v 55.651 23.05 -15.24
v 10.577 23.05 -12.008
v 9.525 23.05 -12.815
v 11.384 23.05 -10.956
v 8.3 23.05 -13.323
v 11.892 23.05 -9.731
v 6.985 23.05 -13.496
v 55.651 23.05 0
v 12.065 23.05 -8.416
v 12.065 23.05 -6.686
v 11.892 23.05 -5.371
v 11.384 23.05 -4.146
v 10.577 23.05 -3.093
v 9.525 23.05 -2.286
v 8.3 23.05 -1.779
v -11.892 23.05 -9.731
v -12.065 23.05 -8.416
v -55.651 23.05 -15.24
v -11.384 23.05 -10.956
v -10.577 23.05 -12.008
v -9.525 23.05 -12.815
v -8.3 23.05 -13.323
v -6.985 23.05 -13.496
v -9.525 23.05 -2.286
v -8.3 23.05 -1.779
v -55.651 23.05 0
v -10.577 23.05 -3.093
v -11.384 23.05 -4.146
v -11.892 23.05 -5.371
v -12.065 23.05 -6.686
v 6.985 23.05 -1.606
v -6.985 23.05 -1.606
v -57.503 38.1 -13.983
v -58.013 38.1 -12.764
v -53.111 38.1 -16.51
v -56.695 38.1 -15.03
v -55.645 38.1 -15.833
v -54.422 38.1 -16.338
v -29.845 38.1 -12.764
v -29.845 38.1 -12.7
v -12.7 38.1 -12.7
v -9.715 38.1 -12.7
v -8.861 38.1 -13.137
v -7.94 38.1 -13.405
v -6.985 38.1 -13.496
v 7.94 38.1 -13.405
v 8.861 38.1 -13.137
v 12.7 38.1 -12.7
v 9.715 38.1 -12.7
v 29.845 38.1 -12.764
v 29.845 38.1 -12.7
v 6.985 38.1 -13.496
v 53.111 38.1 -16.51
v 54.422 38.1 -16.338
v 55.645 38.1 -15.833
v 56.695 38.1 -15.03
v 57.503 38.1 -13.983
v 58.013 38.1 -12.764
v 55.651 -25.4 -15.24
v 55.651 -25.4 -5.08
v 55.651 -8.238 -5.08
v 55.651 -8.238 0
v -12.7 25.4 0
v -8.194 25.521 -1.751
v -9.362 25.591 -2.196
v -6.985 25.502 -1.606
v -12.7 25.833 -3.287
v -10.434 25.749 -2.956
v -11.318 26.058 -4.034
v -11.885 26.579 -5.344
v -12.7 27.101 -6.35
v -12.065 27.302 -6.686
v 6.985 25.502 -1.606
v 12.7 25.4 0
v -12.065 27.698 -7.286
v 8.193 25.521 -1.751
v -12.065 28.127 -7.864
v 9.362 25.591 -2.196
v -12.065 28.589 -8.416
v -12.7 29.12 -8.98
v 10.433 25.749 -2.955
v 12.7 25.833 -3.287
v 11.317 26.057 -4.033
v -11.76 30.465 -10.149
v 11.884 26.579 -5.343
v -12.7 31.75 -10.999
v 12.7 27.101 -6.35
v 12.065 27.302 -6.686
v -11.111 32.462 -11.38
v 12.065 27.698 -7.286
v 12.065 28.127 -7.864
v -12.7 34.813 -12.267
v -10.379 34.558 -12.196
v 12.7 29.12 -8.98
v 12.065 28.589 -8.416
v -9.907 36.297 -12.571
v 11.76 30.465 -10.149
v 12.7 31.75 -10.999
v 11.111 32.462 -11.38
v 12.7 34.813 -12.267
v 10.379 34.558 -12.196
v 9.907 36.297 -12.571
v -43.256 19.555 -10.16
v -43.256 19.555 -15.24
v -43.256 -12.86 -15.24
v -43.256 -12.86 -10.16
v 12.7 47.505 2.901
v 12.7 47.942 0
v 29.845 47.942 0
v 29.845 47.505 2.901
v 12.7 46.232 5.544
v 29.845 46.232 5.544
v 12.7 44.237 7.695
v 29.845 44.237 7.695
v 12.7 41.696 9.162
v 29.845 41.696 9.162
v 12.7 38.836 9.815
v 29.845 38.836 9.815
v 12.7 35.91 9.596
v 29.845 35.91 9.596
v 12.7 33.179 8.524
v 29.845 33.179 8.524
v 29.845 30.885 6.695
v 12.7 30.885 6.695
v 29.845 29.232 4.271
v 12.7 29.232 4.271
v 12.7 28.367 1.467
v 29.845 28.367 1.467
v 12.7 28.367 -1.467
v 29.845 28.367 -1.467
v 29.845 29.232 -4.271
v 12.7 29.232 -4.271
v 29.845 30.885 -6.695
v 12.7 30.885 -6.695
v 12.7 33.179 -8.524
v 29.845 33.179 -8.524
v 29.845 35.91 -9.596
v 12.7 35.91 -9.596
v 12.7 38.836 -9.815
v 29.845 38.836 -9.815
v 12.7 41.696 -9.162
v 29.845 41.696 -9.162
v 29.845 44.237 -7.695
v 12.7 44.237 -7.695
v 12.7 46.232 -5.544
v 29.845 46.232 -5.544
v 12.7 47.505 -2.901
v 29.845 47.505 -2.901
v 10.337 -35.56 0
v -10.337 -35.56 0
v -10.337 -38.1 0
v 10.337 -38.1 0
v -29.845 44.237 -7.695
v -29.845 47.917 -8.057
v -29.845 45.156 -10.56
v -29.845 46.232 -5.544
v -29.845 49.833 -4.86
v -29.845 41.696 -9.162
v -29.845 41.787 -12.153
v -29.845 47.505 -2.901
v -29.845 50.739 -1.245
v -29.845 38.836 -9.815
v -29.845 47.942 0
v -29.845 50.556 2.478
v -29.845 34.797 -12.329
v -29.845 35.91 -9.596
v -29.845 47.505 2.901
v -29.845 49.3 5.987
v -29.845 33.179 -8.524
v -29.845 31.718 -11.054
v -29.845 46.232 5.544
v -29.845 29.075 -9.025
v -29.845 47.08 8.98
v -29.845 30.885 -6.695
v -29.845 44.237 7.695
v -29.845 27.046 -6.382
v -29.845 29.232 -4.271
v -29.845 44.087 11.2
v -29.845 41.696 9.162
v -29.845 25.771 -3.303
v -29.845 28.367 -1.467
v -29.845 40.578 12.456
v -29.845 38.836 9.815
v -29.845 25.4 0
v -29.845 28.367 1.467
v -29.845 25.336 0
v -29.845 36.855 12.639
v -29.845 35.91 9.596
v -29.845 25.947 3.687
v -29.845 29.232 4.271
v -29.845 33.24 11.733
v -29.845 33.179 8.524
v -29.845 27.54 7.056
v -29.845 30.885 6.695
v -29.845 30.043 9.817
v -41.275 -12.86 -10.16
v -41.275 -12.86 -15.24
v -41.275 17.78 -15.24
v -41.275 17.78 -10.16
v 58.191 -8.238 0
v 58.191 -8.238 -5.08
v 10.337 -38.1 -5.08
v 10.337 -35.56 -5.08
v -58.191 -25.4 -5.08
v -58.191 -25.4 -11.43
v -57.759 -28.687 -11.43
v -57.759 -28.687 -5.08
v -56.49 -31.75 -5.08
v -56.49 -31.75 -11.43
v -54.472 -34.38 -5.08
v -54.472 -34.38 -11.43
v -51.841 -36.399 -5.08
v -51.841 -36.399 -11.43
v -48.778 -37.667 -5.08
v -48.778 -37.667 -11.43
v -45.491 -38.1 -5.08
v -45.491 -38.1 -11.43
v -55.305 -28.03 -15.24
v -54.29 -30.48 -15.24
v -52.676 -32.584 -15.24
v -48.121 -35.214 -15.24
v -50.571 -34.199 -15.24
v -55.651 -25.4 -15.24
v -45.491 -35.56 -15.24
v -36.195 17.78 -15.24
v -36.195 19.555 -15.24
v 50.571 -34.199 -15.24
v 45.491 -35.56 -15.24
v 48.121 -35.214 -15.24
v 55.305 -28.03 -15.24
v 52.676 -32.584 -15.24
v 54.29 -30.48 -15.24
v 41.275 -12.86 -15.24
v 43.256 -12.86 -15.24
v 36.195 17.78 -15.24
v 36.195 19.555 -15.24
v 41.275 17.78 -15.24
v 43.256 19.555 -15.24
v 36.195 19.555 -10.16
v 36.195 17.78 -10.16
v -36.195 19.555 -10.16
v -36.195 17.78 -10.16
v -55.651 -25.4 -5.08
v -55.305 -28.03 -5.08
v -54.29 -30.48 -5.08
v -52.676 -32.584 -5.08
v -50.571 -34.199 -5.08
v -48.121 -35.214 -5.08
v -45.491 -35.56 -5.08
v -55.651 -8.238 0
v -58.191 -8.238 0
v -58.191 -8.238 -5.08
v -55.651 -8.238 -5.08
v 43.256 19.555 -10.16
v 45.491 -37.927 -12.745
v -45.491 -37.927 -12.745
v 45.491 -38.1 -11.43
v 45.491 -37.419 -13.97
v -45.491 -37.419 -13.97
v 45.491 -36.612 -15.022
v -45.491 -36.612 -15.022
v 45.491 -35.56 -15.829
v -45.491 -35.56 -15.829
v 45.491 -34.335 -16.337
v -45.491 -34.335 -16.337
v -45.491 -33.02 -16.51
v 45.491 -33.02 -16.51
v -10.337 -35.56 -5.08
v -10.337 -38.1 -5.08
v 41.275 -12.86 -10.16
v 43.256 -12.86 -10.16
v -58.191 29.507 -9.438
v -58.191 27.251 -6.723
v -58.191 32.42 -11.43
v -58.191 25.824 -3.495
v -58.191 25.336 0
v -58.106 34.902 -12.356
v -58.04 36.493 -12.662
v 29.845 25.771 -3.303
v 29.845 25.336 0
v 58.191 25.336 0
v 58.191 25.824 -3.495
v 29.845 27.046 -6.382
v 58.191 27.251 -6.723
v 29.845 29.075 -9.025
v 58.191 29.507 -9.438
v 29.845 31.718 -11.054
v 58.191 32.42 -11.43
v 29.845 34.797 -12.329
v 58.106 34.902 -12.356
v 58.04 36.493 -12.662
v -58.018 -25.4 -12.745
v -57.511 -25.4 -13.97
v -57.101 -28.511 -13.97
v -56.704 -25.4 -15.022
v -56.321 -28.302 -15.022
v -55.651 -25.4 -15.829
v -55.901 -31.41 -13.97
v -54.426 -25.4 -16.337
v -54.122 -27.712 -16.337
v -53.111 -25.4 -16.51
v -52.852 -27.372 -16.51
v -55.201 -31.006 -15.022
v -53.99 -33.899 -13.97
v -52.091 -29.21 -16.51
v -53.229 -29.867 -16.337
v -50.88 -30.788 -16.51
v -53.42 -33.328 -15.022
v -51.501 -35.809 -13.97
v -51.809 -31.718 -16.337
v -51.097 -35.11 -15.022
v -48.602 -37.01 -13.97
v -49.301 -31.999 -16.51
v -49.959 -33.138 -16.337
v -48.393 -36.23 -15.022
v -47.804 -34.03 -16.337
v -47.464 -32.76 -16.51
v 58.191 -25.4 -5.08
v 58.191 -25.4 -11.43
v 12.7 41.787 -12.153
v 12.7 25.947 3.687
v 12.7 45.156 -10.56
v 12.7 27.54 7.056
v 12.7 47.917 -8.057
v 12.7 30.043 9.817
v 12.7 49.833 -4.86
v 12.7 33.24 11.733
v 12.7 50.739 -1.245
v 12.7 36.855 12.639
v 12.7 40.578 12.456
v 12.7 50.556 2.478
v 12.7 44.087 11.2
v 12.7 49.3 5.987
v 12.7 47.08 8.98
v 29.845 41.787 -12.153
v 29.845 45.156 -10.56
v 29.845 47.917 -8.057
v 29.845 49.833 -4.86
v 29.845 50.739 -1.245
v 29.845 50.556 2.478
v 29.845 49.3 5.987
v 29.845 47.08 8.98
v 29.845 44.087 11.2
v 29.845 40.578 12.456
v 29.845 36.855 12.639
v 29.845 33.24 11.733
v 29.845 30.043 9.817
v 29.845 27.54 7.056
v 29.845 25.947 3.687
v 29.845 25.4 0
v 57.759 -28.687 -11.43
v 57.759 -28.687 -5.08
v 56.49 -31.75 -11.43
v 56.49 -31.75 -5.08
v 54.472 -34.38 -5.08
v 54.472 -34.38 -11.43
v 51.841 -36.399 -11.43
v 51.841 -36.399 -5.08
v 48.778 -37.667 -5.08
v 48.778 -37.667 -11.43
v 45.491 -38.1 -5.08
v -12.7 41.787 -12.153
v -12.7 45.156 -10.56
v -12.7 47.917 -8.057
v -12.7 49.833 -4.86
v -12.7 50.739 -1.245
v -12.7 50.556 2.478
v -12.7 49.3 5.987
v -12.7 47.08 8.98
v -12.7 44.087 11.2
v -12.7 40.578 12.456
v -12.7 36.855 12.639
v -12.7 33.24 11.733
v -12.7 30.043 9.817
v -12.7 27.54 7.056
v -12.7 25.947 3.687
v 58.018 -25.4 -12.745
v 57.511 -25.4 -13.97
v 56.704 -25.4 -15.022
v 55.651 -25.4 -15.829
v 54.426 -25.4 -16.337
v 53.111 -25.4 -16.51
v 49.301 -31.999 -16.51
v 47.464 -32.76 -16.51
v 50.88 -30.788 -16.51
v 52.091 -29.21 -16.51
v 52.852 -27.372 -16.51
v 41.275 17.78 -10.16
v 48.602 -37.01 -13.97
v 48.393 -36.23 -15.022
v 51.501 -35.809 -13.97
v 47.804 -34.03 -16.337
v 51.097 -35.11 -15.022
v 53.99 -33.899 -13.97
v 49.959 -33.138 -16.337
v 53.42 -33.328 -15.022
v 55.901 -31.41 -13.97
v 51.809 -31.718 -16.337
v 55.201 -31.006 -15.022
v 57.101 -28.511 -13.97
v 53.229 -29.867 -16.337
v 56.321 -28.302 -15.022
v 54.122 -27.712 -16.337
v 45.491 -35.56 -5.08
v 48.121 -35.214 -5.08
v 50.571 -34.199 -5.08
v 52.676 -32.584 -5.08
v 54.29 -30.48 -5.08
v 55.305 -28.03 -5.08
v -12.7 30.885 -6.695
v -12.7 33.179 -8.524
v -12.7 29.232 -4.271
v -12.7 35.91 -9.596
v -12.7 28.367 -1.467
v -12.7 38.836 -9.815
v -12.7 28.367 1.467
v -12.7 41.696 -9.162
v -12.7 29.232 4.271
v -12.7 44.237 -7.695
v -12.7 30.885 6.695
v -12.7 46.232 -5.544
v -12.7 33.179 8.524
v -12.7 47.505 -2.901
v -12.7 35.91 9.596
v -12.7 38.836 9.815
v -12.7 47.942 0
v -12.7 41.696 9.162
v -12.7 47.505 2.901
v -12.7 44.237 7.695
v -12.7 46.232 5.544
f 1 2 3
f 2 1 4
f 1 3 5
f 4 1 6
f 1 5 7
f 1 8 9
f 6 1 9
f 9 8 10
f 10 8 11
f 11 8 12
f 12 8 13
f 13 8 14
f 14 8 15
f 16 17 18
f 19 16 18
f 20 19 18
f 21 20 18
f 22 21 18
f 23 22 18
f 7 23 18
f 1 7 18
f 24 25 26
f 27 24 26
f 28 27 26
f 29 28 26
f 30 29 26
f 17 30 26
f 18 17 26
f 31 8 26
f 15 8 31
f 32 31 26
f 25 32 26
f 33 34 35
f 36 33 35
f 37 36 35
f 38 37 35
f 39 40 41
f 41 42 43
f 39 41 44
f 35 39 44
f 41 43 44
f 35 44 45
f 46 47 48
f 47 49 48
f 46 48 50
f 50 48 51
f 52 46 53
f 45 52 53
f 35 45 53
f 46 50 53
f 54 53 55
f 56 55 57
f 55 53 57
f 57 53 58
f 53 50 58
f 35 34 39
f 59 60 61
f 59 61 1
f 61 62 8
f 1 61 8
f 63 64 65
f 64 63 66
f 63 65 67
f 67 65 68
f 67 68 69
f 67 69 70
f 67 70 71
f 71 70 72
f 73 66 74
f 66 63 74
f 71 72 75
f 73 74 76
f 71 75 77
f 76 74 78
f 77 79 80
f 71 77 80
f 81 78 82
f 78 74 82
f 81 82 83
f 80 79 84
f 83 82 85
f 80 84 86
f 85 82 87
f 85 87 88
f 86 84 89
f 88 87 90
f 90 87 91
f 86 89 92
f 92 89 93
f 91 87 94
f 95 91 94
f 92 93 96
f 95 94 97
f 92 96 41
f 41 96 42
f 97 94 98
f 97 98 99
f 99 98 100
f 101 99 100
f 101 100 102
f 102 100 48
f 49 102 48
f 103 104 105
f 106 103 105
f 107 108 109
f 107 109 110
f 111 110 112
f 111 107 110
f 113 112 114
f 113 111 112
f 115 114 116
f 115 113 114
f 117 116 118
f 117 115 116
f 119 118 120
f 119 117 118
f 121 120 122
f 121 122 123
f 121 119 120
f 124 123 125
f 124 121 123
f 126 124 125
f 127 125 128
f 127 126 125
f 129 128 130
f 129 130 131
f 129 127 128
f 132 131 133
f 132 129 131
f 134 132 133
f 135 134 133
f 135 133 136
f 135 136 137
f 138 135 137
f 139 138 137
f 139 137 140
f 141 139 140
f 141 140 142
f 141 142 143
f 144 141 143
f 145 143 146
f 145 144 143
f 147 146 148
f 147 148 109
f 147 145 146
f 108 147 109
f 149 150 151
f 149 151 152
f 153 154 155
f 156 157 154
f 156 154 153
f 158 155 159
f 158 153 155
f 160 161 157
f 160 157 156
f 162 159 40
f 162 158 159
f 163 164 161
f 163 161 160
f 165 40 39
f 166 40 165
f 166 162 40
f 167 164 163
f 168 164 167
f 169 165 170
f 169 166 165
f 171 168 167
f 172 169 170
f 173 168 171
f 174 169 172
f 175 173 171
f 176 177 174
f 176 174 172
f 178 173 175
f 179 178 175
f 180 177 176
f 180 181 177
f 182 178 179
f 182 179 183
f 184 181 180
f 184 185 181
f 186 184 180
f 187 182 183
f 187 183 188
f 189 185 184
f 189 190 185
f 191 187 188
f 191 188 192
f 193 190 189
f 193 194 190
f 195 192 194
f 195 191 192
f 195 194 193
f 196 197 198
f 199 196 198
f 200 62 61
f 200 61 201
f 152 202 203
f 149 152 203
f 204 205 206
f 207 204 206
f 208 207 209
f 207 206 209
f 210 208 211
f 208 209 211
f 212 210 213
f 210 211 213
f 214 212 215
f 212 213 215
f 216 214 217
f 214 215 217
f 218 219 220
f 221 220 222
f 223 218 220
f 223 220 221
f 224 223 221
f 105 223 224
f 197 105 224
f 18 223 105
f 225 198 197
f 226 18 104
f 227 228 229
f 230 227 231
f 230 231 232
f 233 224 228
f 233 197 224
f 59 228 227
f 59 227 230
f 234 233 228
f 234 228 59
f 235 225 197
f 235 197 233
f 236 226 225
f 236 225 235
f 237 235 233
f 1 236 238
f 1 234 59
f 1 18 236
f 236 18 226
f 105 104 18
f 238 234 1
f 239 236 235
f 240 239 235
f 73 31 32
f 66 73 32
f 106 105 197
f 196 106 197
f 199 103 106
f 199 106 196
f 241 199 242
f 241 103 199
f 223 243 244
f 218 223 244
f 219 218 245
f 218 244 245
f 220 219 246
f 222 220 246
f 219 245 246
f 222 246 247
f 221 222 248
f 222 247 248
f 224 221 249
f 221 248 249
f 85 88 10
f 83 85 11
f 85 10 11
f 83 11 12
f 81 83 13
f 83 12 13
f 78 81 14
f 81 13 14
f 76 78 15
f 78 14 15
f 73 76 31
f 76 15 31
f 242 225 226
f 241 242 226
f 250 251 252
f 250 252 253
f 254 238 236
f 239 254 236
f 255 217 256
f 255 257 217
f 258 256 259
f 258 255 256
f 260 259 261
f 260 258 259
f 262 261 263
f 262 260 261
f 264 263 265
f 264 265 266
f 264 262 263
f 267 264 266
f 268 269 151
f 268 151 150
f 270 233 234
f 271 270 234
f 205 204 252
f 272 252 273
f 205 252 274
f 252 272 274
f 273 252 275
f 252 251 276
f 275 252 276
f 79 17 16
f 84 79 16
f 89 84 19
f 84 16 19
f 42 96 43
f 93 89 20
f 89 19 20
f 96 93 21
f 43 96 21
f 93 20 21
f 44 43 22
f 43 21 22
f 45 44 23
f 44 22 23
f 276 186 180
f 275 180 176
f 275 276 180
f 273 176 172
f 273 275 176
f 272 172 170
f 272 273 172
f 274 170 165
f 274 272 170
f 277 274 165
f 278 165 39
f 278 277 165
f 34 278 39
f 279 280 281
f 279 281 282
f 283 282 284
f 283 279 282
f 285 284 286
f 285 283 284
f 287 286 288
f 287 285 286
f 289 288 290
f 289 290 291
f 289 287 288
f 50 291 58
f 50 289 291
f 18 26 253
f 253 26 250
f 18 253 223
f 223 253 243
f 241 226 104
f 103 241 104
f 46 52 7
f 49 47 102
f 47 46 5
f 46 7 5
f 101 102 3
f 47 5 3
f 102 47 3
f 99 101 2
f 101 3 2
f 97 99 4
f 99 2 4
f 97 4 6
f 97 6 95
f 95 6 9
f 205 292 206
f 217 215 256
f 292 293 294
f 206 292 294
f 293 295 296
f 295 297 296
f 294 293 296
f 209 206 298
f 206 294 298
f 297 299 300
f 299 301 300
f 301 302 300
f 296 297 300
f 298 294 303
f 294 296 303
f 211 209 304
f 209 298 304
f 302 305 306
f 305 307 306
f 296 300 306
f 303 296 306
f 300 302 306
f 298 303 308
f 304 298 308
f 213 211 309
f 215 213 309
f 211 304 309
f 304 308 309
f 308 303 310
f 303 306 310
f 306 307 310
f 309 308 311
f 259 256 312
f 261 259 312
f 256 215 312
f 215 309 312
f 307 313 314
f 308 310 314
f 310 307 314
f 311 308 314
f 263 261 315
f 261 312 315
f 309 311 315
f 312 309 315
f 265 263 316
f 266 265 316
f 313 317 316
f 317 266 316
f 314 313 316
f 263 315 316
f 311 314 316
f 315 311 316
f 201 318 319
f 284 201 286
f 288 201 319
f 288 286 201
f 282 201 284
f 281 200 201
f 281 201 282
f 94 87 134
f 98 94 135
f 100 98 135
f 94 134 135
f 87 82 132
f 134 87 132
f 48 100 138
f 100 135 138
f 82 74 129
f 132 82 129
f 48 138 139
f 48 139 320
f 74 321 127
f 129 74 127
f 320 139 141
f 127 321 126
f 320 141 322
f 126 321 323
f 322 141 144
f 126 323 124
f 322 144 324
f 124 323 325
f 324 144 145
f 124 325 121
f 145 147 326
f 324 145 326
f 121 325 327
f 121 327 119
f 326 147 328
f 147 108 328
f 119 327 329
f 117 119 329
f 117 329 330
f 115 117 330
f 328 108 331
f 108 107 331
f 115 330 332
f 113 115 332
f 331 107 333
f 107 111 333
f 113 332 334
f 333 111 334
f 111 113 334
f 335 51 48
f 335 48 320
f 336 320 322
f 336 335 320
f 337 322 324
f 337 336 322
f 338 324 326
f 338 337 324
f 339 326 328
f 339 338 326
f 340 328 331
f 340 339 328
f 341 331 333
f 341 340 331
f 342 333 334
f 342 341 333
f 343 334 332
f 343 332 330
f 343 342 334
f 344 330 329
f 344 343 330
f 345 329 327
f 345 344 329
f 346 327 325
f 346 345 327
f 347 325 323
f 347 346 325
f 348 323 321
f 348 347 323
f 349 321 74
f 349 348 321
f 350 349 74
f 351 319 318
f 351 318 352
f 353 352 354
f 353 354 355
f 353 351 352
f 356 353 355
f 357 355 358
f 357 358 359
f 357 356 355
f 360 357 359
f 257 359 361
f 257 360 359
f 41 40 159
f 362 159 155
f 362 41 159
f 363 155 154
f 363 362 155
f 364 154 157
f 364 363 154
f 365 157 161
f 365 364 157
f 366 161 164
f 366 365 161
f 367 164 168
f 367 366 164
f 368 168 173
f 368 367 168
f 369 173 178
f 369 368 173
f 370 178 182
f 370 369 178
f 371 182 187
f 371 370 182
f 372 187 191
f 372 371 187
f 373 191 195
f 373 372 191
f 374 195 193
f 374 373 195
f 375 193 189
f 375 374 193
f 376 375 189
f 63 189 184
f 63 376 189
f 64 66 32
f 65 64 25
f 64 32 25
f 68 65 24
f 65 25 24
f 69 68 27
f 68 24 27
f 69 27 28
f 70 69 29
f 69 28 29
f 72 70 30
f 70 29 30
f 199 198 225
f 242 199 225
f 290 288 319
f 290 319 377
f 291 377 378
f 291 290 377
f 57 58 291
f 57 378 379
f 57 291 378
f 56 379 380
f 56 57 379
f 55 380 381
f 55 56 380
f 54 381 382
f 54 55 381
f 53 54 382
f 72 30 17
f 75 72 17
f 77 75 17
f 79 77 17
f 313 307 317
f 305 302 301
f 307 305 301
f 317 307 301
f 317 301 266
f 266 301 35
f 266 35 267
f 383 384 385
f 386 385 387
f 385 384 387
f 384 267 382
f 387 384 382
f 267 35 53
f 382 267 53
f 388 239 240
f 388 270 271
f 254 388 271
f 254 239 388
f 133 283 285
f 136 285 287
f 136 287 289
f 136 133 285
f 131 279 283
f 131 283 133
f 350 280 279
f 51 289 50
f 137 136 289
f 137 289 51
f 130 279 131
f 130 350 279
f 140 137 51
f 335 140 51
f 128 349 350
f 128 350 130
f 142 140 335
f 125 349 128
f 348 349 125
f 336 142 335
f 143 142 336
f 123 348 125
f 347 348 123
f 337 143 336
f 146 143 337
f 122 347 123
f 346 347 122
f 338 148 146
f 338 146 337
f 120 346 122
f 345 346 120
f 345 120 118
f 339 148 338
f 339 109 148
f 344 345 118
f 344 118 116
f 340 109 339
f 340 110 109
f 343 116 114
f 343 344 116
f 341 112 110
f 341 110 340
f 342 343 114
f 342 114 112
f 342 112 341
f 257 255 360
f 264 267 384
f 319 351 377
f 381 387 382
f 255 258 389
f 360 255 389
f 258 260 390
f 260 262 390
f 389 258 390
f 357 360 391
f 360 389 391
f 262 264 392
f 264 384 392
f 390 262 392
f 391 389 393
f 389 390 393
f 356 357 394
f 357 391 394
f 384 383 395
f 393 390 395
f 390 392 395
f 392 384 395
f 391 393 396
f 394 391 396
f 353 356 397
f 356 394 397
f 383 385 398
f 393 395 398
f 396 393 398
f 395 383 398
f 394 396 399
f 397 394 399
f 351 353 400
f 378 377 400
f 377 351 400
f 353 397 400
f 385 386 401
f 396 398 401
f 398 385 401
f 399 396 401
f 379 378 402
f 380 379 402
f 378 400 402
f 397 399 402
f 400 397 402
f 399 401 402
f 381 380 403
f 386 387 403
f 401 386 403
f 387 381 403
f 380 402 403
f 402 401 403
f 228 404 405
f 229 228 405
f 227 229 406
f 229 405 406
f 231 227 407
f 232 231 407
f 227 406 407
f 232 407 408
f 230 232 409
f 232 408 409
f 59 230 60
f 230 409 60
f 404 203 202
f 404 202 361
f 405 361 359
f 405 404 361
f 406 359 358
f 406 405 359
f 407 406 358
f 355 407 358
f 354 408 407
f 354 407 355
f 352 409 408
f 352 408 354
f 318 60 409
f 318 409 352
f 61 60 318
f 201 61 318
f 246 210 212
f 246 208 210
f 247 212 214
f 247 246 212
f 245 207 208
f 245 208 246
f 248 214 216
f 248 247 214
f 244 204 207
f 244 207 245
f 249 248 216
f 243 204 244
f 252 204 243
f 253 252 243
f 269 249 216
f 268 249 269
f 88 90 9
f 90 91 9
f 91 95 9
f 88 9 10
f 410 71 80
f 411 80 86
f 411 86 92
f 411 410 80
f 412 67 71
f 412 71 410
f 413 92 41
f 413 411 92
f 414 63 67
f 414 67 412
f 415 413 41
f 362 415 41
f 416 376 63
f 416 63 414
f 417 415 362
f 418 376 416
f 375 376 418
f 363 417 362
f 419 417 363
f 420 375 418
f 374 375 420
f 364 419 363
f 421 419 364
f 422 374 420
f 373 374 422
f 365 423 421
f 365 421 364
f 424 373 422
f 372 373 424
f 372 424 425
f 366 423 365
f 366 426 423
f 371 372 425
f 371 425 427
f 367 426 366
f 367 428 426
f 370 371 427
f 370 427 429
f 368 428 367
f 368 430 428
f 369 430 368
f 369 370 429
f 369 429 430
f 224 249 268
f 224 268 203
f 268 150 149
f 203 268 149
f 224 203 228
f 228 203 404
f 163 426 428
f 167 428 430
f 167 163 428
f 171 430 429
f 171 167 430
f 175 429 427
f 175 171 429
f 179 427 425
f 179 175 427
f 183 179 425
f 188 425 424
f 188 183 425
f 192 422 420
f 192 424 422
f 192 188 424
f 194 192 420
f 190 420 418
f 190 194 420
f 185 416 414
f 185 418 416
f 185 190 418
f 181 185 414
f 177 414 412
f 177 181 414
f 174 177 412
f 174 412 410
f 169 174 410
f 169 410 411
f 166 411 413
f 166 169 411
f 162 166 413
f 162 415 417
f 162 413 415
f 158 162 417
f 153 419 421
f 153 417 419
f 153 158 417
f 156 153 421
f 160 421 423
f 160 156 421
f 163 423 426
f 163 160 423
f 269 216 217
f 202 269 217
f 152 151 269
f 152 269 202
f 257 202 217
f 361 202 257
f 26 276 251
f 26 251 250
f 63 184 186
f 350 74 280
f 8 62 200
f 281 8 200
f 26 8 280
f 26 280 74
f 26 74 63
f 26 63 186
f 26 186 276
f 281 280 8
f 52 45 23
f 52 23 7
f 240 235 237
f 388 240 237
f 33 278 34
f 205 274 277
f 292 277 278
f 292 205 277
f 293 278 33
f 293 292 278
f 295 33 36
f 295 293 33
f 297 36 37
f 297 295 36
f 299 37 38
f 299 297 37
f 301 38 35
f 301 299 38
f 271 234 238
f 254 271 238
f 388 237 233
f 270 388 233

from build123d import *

# Parameters (mm, degrees)
F0_W      = 116.3828
F0_H      = 76.2
F1_DEPTH  = 16.51
F2_R      = 12.7
F3_DEPTH  = 63.5
F4_R      = 12.7
F7_R      = 5.08
F9_DEPTH  = 15.24
F10_R     = 12.7
F11_DEPTH = 12.7
F13_DEPTH = 25.4
F15_DEPTH = 5.08
F16_W     = 47.8547876488
F16_H     = 29.861765301
F17_DEPTH = 5.08


with BuildPart() as f1:
    # F0 (on Top) → F1 (new body)
    with BuildSketch(Plane.XY):
        Rectangle(F0_W, F0_H)
    extrude(amount=-F1_DEPTH)

    # F2 (on Right) → F3 (join, symmetric)
    with BuildSketch(Plane.YZ):
        with Locations((38.1, 0)):
            Circle(F2_R)
    extrude(amount=F3_DEPTH, both=True)

    # F4
    f4_edges = [f1.edges().sort_by_distance(p)[0] for p in [
        (-58.1914, -38.1, -8.255),
        (58.1914, -38.1, -8.255),
    ]]
    fillet(f4_edges, radius=F4_R)

    # F5 (on Top) → F6 (revolve, cut)
    with BuildSketch(Plane.XY):
        Polygon((-63.5, 50.8635), (-63.5, 38.1), (0, 38.1), (63.5, 38.1), (63.5, 50.8635), (29.845, 50.8635), (29.845, 47.9425), (0, 47.9425), (-29.845, 47.9425), (-29.845, 50.8635), align=None)
    revolve(axis=Axis((31.75, 38.1, 0), (1, 0, 0)), mode=Mode.SUBTRACT)

    # F7
    f7_edges = [f1.edges().sort_by_distance(p)[0] for p in [
        (58.1914, 6.35, -16.51),
    ]]
    fillet(f7_edges, radius=F7_R)

    # F8 (on face) → F9 (cut)
    with BuildSketch(Plane.XY):
        with BuildLine():
            Line((55.6514, -23.0505), (55.6514, 23.0505))
            Line((55.6514, 23.0505), (-55.6514, 23.0505))
            Line((-55.6514, 23.0505), (-55.6514, -23.0505))
            Line((-55.6514, -23.0505), (-55.6514, -25.4))
            ThreePointArc((-55.6514, -25.4), (-52.6756048969, -32.5842048969), (-45.4914, -35.56))
            Line((-45.4914, -35.56), (45.4914, -35.56))
            ThreePointArc((45.4914, -35.56), (52.6756048969, -32.5842048969), (55.6514, -25.4))
            Line((55.6514, -25.4), (55.6514, -23.0505))
        make_face()
    extrude(amount=-F9_DEPTH, mode=Mode.SUBTRACT)

    # F10 (on Right) → F11 (cut, symmetric)
    with BuildSketch(Plane.YZ):
        with Locations((38.1, 0)):
            Circle(F10_R)
    extrude(amount=F11_DEPTH, both=True, mode=Mode.SUBTRACT)

    # F12 (on face) → F13 (cut)
    with BuildSketch(Plane.XZ.offset(-23.0505)):
        with BuildLine():
            Line((6.985, -1.605504806), (-6.985, -1.605504806))
            ThreePointArc((-6.985, -1.605504806), (-10.5771024484, -3.0934023576), (-12.065, -6.685504806))
            Line((-12.065, -6.685504806), (-12.065, -8.4159879088))
            ThreePointArc((-12.065, -8.4159879088), (-10.5771024484, -12.0080903572), (-6.985, -13.4959879088))
            Line((-6.985, -13.4959879088), (6.985, -13.4959879088))
            ThreePointArc((6.985, -13.4959879088), (10.5771024484, -12.0080903572), (12.065, -8.4159879088))
            Line((12.065, -8.4159879088), (12.065, -6.685504806))
            ThreePointArc((12.065, -6.685504806), (10.5771024484, -3.0934023576), (6.985, -1.605504806))
        make_face()
    extrude(amount=-F13_DEPTH, mode=Mode.SUBTRACT)

    # F14 (on face) → F15 (join)
    with BuildSketch(Plane.XY.offset(-15.24)):
        Polygon((-41.275, -12.8604971486), (-41.275, 17.78), (-36.195, 17.78), (-36.195, 19.5553619415), (-43.2557910681, 19.5553619415), (-43.2557910681, -12.8604971486), align=None)
        Polygon((36.195, 19.5553619415), (36.195, 17.78), (41.275, 17.78), (41.275, -12.8604971486), (43.2557910681, -12.8604971486), (43.2557910681, 19.5553619415), align=None)
    extrude(amount=F15_DEPTH)

    # F16 (on face) → F17 (cut)
    with BuildSketch(Plane.XY):
        with Locations((-34.2640061756, -23.1691173495)):
            Rectangle(F16_W, F16_H)
        with Locations((34.2640061756, -23.1691173495)):
            Rectangle(F16_W, F16_H)
    extrude(amount=-F17_DEPTH, mode=Mode.SUBTRACT)


solid = f1.part
